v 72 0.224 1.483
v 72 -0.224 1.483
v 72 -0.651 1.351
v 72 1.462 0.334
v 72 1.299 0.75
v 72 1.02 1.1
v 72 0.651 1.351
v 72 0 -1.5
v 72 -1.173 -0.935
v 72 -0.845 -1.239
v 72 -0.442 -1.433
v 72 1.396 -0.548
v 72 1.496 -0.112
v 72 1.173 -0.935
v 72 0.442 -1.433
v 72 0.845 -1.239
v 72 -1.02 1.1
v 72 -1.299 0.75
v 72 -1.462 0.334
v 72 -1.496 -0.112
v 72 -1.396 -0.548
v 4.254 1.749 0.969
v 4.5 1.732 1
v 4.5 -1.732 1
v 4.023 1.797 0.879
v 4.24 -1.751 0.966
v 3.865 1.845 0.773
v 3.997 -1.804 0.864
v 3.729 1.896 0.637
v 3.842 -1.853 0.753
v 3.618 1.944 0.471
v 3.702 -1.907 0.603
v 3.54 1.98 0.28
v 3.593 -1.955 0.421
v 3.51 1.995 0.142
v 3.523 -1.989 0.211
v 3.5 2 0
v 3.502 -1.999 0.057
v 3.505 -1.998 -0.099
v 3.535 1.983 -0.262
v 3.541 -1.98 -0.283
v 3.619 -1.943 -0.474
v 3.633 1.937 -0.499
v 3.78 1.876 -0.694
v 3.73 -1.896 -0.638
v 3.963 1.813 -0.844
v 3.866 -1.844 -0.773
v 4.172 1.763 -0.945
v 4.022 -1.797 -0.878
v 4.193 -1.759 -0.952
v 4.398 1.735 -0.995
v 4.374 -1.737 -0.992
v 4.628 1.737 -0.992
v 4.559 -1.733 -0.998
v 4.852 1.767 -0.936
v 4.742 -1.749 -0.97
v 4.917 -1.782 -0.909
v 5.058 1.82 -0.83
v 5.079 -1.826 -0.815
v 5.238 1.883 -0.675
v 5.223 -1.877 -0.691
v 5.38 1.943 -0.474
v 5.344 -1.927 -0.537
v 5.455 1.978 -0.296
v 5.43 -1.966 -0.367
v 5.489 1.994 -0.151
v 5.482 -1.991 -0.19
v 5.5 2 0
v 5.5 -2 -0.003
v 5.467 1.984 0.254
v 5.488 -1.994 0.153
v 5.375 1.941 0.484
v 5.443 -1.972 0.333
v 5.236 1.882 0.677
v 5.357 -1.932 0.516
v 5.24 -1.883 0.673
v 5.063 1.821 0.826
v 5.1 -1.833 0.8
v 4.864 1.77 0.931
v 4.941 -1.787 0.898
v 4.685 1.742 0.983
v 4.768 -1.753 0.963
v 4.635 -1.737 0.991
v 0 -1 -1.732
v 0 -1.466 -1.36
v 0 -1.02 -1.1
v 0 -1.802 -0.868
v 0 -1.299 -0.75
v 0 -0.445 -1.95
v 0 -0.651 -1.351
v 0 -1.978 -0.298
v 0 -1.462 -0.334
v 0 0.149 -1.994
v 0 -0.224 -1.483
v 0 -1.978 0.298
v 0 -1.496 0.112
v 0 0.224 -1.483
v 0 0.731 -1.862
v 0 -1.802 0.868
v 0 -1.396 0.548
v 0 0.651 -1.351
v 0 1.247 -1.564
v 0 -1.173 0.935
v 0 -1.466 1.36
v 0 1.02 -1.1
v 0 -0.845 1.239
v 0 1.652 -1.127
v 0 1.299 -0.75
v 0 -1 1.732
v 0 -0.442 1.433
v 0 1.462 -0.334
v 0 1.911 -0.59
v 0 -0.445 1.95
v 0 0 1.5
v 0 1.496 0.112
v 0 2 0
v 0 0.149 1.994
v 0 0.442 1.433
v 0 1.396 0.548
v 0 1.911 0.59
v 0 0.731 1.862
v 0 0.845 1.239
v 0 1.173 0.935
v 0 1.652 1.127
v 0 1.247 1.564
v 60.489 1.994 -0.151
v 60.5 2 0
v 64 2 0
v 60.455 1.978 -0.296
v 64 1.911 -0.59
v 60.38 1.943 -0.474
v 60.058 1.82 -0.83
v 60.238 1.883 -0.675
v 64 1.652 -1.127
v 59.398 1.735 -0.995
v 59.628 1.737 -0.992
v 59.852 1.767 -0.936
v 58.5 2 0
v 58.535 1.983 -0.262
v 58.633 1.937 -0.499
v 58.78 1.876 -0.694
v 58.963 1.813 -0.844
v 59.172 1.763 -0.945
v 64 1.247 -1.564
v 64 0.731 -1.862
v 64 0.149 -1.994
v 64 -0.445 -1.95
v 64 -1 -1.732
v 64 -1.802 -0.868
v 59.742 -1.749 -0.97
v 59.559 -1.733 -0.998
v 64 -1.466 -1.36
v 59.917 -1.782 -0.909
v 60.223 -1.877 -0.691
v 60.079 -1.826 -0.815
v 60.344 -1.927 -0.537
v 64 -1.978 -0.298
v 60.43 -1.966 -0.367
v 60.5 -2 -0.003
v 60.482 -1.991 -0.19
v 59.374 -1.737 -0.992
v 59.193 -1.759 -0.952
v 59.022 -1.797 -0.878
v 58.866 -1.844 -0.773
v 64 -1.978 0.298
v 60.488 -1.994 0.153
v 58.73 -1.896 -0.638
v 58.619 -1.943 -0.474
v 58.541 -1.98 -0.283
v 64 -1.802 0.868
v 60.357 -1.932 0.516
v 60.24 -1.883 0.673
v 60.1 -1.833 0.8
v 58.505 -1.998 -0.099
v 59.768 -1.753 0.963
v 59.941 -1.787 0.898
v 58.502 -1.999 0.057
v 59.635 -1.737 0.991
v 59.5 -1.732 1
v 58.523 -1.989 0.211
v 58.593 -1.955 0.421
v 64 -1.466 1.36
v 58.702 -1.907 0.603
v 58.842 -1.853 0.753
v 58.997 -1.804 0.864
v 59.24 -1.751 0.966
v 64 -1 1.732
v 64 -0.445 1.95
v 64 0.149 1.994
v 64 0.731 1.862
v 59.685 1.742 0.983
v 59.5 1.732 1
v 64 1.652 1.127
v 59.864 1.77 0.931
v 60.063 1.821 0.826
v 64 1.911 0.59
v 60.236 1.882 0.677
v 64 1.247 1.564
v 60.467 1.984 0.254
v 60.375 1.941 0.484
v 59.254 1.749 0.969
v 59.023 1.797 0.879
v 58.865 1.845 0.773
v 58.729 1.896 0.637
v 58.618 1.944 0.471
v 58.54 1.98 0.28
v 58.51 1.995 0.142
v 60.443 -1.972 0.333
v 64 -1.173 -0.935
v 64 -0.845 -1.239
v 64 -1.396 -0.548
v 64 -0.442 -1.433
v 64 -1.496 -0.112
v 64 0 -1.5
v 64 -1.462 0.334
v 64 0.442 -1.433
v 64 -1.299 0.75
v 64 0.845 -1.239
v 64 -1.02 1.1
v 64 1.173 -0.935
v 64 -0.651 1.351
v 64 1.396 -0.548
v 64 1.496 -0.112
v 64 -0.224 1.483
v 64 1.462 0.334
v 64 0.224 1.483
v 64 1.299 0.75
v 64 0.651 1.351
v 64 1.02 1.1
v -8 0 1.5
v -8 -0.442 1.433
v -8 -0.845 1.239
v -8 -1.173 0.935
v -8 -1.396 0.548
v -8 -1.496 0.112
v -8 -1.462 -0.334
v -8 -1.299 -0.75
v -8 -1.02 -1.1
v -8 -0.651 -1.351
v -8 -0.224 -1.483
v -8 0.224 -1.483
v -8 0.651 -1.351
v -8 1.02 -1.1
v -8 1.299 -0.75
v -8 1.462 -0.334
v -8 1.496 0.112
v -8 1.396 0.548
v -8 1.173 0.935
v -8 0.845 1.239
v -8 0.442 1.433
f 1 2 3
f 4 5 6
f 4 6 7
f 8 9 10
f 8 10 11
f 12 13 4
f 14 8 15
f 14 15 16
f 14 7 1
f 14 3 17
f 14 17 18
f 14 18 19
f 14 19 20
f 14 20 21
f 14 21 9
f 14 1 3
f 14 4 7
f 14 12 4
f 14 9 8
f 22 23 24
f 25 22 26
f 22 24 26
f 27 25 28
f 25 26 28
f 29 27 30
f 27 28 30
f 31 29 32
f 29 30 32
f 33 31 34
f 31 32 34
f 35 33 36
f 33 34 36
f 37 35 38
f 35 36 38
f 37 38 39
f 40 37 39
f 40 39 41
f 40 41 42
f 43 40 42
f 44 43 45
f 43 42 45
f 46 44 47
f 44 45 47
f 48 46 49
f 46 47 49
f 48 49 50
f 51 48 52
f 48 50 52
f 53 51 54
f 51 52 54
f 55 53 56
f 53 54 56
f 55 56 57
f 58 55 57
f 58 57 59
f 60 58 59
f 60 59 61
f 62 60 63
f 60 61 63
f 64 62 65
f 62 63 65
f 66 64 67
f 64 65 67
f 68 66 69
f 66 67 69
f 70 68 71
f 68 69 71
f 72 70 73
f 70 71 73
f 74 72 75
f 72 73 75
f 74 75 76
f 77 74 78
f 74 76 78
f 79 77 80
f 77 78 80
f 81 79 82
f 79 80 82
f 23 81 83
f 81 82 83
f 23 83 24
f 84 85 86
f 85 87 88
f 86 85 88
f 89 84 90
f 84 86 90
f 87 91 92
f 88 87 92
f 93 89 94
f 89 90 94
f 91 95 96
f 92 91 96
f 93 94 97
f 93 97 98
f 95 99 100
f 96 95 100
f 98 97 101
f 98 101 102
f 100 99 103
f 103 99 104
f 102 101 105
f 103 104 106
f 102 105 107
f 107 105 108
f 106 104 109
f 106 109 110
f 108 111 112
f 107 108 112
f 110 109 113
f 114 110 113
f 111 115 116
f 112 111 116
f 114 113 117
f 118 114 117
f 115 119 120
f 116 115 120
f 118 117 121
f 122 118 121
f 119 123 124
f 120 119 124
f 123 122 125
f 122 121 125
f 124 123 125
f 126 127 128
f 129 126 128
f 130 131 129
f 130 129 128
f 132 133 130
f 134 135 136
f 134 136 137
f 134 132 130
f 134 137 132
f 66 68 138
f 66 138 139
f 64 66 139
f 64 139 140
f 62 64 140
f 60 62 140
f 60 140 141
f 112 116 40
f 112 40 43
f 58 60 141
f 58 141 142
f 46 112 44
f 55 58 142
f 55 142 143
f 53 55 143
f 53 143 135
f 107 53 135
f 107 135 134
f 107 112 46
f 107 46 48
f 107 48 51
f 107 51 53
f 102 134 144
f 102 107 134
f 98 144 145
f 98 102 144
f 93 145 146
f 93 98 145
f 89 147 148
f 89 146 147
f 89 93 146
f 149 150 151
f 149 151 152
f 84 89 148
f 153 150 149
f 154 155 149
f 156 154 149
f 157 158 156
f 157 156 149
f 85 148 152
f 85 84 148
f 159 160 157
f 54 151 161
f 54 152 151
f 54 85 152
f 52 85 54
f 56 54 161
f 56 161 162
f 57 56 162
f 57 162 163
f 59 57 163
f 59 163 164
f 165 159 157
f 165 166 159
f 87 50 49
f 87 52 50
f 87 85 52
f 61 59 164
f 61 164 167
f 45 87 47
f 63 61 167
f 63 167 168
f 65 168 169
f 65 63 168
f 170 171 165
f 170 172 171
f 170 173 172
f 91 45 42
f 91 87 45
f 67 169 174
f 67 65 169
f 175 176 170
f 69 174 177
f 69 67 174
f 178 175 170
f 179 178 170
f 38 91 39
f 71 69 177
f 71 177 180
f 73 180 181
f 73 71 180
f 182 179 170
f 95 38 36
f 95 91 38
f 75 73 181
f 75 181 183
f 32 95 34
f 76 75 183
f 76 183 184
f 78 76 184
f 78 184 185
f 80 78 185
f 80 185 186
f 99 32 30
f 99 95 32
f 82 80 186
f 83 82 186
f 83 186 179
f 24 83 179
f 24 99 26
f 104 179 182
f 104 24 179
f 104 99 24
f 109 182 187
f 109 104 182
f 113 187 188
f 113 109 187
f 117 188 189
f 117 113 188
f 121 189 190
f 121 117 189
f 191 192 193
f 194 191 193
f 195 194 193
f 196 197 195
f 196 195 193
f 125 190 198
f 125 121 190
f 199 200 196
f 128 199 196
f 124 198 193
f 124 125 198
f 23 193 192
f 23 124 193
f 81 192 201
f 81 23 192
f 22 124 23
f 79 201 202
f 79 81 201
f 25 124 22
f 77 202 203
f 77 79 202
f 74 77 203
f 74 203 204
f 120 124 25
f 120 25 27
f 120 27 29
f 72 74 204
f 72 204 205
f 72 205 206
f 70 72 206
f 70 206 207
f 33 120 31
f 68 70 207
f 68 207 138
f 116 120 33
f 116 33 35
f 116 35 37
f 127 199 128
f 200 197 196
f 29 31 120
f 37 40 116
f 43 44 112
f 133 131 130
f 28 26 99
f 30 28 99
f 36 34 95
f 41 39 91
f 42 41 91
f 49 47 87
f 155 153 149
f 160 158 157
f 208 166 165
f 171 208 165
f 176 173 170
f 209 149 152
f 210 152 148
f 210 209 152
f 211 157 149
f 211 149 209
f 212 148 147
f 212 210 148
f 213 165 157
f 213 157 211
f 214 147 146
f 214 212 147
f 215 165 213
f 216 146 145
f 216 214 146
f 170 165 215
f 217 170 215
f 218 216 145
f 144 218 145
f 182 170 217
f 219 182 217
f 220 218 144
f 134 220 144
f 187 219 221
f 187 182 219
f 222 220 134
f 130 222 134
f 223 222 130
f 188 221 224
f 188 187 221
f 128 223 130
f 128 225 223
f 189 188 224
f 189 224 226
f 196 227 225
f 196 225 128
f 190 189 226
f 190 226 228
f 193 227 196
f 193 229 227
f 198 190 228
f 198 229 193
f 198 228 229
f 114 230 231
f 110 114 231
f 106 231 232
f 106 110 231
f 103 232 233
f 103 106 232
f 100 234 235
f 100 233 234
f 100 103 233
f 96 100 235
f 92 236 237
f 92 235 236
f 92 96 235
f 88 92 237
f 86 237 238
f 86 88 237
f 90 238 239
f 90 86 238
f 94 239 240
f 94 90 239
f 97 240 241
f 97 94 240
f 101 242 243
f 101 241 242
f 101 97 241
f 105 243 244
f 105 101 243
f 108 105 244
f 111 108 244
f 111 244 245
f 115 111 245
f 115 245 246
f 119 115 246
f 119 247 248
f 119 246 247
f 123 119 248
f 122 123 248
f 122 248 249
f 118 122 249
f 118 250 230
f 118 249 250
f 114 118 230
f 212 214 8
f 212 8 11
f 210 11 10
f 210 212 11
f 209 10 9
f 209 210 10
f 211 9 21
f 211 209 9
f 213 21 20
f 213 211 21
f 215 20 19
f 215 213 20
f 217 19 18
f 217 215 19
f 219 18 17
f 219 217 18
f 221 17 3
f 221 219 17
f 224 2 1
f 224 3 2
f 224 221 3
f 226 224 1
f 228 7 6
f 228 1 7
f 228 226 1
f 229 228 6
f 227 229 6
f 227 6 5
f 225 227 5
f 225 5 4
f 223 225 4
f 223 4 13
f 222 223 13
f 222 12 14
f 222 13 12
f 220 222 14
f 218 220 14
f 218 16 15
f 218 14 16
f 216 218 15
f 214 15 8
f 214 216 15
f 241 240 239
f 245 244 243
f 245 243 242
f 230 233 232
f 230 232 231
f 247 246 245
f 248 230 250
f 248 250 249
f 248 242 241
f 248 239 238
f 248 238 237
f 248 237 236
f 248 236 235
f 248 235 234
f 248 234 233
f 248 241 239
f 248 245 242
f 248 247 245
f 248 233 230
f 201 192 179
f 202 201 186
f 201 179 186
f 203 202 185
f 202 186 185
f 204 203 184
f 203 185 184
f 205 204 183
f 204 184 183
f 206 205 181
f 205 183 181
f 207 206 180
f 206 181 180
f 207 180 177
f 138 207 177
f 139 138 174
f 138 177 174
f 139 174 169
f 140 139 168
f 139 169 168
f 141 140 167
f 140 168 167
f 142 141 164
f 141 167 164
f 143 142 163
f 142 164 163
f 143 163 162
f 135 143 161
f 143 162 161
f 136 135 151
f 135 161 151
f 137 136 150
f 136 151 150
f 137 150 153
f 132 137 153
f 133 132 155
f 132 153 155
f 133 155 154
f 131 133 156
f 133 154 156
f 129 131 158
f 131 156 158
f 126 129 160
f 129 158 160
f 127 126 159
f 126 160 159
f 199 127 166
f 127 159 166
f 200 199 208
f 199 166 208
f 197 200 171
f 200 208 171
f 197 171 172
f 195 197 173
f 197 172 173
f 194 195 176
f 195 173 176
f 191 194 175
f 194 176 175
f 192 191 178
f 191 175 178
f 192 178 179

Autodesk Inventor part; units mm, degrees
ref_plane "YZ Plane" through (0, 0, 0) normal (1, 0, 0) x (0, 1, 0)
ref_plane "XZ Plane" through (0, 0, 0) normal (0, 1, 0) x (-1, 0, 0)
ref_plane "XY Plane" through (0, 0, 0) normal (0, 0, 1) x (1, 0, 0)
sketch "スケッチ1" plane through (0, 0, 0) normal (1, 0, 0) x (0, 1, 0)
  circle A0 centre (0, 0) radius 2
  dimension "d0" = 4
extrude "押し出し1" add sketch "スケッチ1" along normal blind 64
sketch "スケッチ4" plane through (0, 0, 0) normal (-1, 0, 0) x (0, 0, 1)
  circle A0 centre (0, 0) radius 1.5
  dimension "d16" = 3
extrude "押し出し2" add sketch "スケッチ4" along normal blind 8
sketch "スケッチ5" plane through (64, 0, 0) normal (1, 0, 0) x (0, 0, -1)
  circle A0 centre (0, 0) radius 1.5
  dimension "d19" = 3
extrude "押し出し3" add sketch "スケッチ5" along normal blind 8
thread "ねじ1" size "M3x0.5" class "6g" standard "ISO Metric profile" length 8
thread "ねじ2" size "M3x0.5" class "6g" standard "ISO Metric profile" length 8
sketch "スケッチ2" plane through (64, 0, 0) normal (1, 0, 0) x (0, 0, -1)
  circle A0 centre (0, 0) radius 2 projected
  line L0 (0, -2.8) -> (0, 2.8) projected
  point P0 (0, 2)
ref_plane "作業平面1" through (64, 2, 0) normal (0, 1, 0) x (-1, 0, 0)
sketch "スケッチ3" plane through (64, 2, 0) normal (0, 1, 0) x (-1, 0, 0)
  line L0 (64, 0) -> (0, 0)
  line L1 (0, 2) -> (0, -2) projected
  line L2 (-8, 1.5) -> (-8, -1.5) projected
  line L3 (72, -1.5) -> (72, 1.5) projected
  point P0 (4.5, 0)
  point P1 (59.5, 0)
  dimension "d22" = 12.5
  dimension "d23" = 12.5
hole "穴1" at (59.5, 2, 0) at (4.5, 2, 0) direction (0, -1, 0) diameter 2 end through all
equation "\"d23\" = d22"
properties part number "GearShaft_1" material "鉄、鋳鉄"
